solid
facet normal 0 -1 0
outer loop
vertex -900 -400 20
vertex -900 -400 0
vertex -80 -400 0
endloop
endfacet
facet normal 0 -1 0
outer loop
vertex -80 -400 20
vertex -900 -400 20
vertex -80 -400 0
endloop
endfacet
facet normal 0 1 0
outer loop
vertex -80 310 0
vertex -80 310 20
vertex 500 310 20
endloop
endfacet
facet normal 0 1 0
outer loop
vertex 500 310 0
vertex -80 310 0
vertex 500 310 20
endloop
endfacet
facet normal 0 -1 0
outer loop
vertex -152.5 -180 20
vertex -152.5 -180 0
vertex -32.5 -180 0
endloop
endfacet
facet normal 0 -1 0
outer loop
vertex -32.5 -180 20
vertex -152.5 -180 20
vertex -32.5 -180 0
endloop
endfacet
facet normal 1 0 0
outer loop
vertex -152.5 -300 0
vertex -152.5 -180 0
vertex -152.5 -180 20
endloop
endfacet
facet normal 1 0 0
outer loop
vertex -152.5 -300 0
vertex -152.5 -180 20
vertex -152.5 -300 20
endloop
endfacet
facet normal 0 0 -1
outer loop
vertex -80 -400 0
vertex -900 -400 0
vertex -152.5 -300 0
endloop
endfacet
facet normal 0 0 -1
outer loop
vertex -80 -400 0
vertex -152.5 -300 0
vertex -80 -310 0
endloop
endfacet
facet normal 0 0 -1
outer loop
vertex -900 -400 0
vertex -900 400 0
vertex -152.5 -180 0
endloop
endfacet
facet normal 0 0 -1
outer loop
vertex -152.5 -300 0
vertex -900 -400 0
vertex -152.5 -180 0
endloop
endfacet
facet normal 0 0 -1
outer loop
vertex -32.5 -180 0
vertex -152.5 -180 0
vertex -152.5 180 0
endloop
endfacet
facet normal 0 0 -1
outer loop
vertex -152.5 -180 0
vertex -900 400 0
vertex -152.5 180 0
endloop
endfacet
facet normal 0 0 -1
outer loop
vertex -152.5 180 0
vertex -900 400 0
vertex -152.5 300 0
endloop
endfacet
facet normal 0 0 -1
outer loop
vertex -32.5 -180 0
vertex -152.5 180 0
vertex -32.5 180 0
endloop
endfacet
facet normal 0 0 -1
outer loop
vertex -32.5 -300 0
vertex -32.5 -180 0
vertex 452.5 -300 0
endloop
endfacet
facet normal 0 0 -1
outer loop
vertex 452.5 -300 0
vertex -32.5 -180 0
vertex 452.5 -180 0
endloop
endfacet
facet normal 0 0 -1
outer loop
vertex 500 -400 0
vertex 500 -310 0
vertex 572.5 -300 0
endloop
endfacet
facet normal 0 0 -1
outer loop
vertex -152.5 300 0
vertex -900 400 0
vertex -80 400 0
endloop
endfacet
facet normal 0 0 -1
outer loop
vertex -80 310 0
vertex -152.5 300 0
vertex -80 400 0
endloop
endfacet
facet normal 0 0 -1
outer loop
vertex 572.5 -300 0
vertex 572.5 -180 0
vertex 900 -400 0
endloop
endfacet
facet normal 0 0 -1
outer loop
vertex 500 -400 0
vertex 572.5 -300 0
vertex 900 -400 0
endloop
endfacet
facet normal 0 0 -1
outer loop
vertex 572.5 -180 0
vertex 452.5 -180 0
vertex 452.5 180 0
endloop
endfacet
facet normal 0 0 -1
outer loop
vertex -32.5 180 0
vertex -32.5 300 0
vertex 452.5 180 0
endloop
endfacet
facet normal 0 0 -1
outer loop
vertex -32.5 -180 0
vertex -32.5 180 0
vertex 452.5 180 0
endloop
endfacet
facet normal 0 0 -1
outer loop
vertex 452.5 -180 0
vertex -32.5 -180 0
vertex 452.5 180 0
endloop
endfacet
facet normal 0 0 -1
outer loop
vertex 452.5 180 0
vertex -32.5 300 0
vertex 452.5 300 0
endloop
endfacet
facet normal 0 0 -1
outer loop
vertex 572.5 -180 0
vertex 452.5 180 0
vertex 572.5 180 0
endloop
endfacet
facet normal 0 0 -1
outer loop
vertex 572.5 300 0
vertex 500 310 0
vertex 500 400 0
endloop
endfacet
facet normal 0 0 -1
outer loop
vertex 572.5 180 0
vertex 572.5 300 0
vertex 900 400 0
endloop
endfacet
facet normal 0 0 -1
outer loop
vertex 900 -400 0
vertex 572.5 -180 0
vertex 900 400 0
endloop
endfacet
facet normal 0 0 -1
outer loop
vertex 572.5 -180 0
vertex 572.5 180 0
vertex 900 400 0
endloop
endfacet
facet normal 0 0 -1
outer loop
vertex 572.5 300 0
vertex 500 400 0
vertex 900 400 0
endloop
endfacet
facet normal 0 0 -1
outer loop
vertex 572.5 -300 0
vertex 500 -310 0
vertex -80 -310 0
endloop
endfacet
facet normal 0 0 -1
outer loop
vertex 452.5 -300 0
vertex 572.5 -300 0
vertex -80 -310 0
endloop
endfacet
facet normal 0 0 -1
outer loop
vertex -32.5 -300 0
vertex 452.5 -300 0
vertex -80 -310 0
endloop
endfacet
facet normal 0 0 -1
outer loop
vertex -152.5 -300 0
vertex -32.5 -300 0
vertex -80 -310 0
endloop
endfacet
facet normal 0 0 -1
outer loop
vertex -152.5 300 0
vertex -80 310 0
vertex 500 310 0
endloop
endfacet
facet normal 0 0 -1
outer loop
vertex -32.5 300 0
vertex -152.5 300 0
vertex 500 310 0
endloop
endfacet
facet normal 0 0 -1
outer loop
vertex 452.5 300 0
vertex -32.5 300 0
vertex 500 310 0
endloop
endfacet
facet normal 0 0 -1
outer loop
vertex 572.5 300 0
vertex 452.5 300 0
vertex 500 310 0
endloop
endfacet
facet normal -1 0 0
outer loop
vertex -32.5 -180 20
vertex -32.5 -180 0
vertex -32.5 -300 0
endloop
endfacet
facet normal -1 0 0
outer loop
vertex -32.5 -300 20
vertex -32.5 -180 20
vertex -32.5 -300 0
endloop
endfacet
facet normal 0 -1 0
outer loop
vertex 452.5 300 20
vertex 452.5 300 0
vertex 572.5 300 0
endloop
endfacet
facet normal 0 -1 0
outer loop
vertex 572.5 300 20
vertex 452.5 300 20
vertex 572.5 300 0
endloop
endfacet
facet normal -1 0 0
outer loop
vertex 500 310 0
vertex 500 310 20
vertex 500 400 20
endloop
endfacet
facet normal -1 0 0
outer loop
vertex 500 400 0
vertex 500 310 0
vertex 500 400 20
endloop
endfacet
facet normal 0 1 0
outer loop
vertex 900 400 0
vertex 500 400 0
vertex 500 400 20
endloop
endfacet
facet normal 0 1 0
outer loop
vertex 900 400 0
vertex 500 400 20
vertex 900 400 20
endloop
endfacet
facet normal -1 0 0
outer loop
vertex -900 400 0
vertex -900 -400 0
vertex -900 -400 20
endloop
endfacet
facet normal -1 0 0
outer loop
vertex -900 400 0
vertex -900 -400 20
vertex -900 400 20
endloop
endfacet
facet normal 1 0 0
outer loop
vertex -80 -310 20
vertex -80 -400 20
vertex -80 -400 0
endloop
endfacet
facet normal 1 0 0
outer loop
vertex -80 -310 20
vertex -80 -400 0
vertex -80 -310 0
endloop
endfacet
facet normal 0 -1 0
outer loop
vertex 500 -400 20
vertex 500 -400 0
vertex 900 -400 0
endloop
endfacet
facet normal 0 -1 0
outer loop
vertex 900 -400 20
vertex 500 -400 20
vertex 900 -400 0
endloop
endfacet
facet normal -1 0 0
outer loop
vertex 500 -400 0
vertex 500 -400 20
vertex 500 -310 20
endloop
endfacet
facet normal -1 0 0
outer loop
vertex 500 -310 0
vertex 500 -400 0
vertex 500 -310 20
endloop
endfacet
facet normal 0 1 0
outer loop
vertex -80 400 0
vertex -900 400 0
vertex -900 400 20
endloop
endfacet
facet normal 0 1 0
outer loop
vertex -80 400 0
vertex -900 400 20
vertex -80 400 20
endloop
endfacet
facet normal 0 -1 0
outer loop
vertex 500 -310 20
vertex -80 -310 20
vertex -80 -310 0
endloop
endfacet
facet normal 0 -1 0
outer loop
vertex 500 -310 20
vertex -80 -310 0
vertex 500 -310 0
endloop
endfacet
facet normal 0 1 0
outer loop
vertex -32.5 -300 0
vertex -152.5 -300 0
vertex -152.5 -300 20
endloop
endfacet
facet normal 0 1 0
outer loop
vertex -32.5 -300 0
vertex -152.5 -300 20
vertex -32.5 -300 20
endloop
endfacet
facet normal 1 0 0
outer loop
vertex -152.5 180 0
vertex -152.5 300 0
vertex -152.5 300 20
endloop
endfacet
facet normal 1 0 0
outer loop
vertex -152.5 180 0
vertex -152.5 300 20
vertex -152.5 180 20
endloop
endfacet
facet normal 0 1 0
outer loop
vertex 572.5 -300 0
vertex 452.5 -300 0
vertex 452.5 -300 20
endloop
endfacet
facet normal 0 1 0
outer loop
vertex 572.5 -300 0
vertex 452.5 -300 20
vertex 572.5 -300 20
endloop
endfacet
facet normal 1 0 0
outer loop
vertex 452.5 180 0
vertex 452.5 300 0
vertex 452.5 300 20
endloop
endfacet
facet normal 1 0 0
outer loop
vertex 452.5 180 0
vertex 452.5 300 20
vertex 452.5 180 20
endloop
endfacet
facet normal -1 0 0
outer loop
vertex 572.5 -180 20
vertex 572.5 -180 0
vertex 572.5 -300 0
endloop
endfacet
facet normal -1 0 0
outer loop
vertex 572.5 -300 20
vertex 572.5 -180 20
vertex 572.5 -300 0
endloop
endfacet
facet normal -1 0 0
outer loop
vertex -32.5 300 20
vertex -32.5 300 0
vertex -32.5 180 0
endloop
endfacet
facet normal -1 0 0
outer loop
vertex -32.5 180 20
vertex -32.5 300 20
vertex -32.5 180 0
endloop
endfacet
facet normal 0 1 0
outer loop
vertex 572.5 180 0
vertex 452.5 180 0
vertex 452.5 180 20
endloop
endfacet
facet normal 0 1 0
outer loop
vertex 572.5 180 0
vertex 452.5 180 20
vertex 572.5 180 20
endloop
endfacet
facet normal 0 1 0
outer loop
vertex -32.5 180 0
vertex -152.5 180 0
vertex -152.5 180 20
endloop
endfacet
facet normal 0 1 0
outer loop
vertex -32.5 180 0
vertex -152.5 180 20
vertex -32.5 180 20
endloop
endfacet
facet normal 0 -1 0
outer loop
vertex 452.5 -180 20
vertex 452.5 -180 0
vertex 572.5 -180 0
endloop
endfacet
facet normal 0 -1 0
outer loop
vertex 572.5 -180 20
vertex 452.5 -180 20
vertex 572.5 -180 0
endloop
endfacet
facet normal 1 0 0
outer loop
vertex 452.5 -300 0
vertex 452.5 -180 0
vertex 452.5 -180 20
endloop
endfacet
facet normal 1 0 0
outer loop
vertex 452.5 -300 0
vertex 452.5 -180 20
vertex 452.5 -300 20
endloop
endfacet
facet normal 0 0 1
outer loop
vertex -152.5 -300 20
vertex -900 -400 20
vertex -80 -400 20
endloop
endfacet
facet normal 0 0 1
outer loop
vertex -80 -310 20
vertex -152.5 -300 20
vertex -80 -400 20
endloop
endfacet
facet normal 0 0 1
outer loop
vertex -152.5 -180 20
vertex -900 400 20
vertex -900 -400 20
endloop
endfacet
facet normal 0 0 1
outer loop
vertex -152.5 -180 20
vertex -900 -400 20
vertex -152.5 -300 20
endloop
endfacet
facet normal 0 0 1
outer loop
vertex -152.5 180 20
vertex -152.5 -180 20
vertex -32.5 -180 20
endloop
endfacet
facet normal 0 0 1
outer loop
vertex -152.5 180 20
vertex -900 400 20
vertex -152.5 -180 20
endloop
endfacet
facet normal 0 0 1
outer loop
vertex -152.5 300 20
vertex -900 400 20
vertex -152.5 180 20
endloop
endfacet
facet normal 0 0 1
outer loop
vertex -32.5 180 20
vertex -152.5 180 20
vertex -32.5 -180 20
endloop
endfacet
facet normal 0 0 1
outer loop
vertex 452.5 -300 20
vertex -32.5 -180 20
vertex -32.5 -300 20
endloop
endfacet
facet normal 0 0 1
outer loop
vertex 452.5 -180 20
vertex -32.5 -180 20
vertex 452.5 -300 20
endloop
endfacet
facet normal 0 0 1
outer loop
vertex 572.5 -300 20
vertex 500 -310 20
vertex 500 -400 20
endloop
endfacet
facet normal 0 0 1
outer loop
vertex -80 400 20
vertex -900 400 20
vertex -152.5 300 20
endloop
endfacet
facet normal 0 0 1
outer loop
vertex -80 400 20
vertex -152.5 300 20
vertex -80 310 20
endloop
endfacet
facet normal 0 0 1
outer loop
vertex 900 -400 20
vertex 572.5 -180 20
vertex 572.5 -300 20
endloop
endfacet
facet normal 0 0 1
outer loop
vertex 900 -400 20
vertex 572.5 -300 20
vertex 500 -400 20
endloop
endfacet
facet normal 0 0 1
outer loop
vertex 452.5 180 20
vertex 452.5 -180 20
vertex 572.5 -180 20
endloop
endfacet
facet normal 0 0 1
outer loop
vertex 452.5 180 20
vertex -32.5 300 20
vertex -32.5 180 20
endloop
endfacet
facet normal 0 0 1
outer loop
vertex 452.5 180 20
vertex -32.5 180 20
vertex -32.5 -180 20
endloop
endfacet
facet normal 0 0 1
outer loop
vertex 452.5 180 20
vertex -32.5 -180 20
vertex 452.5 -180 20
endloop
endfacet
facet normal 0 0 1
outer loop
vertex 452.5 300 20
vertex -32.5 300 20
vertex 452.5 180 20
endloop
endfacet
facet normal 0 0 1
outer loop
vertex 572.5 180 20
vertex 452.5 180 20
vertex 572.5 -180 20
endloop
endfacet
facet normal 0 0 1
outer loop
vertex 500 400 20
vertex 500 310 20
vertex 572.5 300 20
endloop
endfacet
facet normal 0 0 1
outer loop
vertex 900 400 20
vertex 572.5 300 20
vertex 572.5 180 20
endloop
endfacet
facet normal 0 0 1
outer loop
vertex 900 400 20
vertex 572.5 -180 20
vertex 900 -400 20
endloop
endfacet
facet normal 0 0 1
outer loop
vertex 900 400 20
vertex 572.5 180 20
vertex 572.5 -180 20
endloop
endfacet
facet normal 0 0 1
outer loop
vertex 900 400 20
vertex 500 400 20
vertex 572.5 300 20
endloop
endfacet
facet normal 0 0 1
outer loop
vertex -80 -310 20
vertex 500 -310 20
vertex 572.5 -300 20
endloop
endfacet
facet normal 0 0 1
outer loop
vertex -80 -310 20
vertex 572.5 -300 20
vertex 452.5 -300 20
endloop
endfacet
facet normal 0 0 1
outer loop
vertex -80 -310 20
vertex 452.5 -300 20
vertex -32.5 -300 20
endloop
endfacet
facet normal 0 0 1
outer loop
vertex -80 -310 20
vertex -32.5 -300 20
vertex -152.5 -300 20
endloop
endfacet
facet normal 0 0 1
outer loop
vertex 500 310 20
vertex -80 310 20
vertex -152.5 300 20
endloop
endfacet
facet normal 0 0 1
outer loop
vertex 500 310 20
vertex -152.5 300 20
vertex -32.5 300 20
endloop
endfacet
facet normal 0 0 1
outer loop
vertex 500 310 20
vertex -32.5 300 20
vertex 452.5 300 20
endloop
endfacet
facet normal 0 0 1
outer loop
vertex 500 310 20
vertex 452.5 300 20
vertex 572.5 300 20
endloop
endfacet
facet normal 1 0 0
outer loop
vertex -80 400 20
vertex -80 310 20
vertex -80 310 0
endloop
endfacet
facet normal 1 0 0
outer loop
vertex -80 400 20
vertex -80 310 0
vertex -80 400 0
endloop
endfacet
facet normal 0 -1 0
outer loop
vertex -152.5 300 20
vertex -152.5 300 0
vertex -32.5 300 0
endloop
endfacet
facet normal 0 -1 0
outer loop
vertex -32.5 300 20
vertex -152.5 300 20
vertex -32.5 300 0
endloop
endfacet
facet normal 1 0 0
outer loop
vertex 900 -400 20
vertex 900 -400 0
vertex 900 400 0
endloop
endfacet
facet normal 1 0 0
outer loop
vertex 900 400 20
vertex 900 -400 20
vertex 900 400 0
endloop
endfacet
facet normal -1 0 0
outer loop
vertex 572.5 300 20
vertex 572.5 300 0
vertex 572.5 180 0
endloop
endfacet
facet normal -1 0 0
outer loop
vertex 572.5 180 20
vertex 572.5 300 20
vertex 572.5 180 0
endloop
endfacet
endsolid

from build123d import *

# Parameters (mm, degrees)
SKETCH_W        = 1800
SKETCH_H        = 800
PAD_DEPTH       = 20
SKETCH001_W     = 580
SKETCH001_H     = 90
POCKET_DEPTH    = 20
SKETCH002_W     = 120
SKETCH002_H     = 120
POCKET001_DEPTH = 20


with BuildPart() as part:
    # Sketch → Pad (new body)
    with BuildSketch(Plane.XY):
        Rectangle(SKETCH_W, SKETCH_H)
    extrude(amount=PAD_DEPTH)

    # Sketch001 (on Face6 of Pad) → Pocket (cut)
    with BuildSketch(Plane.XY.offset(20)):
        with Locations((210, -355)):
            Rectangle(SKETCH001_W, SKETCH001_H)
        with Locations((210, 355)):
            Rectangle(SKETCH001_W, SKETCH001_H)
    extrude(amount=-POCKET_DEPTH, mode=Mode.SUBTRACT)

    # Sketch002 (on Face4 of Pocket) → Pocket001 (cut)
    with BuildSketch(Plane(origin=(0, 0, 0), x_dir=(1, 0, 0), z_dir=(0, 0, -1))):
        with Locations((-92.5, 240)):
            Rectangle(SKETCH002_W, SKETCH002_H)
        with Locations((512.5, 240)):
            Rectangle(SKETCH002_W, SKETCH002_H)
        with Locations((-92.5, -240)):
            Rectangle(SKETCH002_W, SKETCH002_H)
        with Locations((512.5, -240)):
            Rectangle(SKETCH002_W, SKETCH002_H)
    extrude(amount=-POCKET001_DEPTH, mode=Mode.SUBTRACT)


solid = part.part
